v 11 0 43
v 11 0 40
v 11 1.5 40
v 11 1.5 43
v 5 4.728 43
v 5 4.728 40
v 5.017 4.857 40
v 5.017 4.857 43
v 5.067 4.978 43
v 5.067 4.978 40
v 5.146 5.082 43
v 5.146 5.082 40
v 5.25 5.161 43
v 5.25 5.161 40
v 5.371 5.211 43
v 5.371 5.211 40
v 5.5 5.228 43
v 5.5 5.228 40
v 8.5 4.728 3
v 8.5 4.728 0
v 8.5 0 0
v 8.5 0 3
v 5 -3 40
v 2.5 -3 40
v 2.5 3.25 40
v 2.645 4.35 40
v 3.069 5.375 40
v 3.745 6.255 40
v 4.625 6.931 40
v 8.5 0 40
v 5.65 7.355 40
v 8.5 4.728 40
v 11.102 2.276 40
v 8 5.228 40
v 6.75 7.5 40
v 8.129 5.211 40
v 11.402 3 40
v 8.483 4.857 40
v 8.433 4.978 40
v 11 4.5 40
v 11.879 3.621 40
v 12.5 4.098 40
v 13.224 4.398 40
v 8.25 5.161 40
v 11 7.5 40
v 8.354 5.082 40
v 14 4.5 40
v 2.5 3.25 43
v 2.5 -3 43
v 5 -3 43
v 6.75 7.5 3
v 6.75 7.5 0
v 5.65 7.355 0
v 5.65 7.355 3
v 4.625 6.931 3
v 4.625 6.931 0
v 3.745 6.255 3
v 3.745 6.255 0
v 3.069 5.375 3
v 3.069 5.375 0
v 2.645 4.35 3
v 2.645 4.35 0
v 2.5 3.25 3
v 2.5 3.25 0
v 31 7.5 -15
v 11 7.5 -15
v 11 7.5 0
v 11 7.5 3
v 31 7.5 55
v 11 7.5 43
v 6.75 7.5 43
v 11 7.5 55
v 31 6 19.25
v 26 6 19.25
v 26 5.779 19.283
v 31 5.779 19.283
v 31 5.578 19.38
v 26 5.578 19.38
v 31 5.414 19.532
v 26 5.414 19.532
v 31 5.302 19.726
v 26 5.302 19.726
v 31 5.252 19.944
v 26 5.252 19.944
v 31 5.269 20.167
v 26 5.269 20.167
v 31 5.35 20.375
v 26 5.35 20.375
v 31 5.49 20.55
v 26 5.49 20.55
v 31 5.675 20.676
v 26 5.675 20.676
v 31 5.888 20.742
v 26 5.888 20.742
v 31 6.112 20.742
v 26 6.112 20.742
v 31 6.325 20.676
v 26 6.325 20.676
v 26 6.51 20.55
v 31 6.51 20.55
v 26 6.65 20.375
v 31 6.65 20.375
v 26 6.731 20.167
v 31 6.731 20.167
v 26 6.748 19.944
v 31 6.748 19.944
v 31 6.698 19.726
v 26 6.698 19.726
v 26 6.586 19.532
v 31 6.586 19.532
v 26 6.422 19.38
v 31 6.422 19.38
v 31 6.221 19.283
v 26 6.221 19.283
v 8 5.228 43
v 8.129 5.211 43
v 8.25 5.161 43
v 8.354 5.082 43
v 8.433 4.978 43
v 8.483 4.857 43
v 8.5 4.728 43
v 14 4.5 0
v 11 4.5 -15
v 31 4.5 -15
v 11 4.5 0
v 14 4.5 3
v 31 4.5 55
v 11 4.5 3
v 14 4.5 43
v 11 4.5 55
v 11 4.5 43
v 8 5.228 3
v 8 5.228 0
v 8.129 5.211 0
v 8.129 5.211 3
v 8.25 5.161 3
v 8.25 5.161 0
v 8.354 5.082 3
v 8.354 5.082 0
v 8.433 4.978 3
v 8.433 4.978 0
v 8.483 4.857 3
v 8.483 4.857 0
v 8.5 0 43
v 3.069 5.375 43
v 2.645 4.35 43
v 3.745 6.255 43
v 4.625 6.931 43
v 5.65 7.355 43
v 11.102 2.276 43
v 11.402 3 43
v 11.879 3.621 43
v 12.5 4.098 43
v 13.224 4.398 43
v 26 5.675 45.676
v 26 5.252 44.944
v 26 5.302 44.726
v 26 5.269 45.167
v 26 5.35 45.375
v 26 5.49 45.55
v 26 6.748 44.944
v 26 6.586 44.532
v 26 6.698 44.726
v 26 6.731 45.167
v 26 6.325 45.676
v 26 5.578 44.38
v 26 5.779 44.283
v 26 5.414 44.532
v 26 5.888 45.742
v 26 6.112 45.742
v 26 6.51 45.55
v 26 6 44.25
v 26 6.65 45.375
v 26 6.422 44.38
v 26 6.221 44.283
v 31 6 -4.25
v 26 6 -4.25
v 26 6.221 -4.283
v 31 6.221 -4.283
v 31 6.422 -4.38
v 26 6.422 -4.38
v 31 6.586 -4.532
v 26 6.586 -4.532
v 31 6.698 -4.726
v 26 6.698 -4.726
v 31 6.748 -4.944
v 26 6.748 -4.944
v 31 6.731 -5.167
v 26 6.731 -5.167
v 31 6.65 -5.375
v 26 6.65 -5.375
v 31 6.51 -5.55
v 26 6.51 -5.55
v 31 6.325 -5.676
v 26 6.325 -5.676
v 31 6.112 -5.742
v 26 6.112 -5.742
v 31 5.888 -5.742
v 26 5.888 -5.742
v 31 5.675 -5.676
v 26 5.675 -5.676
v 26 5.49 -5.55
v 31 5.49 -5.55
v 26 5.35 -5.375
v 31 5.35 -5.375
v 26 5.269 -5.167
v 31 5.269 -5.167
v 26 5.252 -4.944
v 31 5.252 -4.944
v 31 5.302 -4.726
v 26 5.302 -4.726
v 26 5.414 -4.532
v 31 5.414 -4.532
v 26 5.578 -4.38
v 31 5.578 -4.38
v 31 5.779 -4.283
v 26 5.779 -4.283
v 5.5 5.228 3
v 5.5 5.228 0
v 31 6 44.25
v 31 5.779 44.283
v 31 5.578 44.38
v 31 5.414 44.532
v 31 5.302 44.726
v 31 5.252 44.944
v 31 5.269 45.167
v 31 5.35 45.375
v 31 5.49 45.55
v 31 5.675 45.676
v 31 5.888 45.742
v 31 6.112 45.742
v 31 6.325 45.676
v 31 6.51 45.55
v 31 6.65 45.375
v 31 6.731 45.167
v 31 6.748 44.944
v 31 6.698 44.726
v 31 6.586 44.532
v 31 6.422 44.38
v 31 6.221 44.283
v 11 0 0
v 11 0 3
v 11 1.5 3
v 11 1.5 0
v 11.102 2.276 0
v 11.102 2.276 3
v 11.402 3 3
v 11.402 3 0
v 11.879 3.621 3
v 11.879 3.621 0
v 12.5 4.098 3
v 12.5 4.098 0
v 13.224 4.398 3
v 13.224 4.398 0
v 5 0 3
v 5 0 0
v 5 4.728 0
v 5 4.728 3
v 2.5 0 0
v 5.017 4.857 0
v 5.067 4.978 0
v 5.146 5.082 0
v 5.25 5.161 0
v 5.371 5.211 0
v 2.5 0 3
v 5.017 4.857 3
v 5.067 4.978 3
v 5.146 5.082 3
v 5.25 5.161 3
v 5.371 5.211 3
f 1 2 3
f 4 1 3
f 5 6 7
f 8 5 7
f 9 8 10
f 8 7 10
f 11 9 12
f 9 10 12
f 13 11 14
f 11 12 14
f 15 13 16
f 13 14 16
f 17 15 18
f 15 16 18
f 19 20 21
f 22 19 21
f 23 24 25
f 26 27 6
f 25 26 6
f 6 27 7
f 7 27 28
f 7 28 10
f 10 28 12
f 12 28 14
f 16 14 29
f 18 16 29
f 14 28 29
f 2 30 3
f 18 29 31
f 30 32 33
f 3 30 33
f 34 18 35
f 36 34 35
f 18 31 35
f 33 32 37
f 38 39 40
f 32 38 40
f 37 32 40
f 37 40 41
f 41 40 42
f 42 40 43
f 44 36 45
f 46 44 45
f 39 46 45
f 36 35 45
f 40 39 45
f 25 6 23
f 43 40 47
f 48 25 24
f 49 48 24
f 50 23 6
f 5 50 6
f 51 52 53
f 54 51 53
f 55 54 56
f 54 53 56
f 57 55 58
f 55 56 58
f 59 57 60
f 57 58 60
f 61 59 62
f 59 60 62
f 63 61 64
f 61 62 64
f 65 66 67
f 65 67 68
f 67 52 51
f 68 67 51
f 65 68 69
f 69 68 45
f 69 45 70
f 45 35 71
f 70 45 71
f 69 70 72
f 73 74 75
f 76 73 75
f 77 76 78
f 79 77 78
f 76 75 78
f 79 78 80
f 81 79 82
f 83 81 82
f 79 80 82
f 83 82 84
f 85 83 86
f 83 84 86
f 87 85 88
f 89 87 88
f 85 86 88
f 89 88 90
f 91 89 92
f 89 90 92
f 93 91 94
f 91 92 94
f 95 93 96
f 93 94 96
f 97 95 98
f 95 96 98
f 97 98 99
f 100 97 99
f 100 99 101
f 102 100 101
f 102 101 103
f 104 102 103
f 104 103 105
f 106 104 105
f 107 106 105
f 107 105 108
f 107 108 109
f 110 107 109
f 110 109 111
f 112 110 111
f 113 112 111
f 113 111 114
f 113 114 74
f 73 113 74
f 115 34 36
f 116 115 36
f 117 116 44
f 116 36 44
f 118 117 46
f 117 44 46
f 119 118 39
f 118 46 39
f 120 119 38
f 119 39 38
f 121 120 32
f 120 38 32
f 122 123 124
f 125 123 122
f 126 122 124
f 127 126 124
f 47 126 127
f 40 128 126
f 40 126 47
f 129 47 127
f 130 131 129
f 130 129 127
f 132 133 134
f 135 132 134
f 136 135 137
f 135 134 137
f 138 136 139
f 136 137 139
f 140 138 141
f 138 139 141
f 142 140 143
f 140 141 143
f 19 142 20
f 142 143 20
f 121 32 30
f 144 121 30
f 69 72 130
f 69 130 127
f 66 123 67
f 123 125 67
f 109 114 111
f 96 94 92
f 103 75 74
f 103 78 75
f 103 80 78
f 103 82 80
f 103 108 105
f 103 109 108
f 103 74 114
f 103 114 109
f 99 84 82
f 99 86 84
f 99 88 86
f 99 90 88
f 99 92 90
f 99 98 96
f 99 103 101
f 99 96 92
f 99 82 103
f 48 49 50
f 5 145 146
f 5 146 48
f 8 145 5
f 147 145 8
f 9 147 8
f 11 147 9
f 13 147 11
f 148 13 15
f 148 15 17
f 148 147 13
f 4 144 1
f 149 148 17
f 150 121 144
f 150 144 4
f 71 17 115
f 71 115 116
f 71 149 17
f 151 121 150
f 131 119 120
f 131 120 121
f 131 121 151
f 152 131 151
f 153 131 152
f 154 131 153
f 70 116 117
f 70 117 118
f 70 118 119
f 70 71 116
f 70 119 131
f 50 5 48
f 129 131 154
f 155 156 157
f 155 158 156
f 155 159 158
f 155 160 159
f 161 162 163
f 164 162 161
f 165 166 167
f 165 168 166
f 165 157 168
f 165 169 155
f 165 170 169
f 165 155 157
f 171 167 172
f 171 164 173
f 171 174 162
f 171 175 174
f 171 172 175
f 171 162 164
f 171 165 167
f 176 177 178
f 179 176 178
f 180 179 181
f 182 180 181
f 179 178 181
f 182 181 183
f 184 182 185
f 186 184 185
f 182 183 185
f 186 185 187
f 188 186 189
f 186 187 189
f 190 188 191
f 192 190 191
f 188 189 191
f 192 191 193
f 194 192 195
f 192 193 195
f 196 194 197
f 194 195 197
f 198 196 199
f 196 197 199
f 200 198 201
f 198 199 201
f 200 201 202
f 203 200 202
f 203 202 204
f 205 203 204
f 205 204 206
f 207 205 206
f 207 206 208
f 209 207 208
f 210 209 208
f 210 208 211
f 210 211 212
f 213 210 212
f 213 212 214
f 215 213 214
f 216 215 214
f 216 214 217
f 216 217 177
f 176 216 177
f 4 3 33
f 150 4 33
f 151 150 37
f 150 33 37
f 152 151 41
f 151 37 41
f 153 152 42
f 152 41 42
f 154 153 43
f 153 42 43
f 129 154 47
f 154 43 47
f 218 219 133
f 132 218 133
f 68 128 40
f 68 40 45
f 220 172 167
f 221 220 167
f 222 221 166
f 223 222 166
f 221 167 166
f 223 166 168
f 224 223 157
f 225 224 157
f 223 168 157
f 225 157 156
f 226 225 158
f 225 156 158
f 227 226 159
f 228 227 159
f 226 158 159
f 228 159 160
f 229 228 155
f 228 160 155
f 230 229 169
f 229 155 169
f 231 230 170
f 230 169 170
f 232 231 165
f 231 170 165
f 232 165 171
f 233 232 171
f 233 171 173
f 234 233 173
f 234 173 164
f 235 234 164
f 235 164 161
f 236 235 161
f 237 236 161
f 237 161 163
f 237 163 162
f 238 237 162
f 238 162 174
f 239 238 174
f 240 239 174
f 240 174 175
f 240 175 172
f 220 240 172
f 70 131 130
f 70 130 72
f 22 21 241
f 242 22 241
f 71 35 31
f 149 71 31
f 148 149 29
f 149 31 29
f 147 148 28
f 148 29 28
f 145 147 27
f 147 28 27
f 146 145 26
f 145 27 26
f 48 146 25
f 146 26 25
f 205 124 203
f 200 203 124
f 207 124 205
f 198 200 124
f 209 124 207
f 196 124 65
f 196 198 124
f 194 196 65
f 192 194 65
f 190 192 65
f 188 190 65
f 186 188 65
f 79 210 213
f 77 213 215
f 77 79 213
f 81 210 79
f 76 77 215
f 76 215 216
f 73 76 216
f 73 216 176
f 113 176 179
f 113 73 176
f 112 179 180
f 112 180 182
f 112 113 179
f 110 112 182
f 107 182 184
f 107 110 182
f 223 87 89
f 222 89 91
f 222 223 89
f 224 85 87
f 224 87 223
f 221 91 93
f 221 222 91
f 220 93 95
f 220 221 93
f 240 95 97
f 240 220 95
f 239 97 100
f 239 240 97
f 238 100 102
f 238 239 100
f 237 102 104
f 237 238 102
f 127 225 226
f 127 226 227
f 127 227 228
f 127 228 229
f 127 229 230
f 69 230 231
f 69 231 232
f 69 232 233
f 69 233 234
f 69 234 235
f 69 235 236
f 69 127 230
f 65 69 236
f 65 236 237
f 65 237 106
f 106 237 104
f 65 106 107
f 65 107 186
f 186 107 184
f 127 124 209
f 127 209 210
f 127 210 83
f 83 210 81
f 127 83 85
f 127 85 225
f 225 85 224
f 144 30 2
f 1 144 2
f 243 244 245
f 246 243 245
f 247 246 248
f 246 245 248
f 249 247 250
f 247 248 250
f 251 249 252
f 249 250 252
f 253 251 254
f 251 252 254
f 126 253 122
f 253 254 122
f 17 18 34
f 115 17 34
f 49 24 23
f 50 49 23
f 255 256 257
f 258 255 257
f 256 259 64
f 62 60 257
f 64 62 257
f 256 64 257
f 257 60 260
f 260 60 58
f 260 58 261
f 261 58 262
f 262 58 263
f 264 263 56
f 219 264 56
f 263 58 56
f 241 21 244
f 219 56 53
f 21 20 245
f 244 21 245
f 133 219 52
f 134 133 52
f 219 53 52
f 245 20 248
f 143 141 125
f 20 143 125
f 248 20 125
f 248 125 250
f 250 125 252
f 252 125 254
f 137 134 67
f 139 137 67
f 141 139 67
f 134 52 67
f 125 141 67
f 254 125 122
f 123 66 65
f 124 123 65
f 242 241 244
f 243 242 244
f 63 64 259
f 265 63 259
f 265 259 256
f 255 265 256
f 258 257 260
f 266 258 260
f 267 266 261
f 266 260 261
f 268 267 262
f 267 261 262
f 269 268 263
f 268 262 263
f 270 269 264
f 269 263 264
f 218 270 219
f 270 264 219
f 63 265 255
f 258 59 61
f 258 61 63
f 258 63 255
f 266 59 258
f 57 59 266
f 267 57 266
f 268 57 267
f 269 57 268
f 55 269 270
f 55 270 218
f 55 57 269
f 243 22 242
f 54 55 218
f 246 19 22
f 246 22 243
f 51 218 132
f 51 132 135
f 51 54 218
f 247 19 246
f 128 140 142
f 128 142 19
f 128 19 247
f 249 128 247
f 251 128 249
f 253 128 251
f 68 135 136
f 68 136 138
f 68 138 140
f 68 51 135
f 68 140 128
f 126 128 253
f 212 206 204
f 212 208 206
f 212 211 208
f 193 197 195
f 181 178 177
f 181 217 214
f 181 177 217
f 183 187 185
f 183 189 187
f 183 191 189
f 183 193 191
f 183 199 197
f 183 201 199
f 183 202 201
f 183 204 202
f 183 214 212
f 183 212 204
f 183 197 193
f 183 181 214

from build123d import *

# Parameters (mm, degrees)
BOSS_EXTRUDE1_DEPTH      = 3
LPATTERN1_COUNT          = 2
LPATTERN1_PITCH          = 40
SKETCH2_W                = 20
SKETCH2_H                = 70
BOSS_EXTRUDE2_DEPTH      = 3
FILLET1_R                = 3
BOSS_EXTRUDE3_DEPTH      = 3
FILLET2_START            = -1
FILLET2_DEPTH            = 5
FILLET3_DEPTH            = 3
BOSS_EXTRUDE5_REACH      = 65.784
BOSS_EXTRUDE5_END_RADIUS = 10.25
SKETCH5_R                = 1.5
LPATTERN2_START          = 7.5
LPATTERN2_OUTLINE_R      = 1.5
LPATTERN2_DEPTH          = 1.302234895
LPATTERN2_START_2        = 8.802234895
LPATTERN2_2_OUTLINE_R    = 1.5
LPATTERN2_2_DEPTH        = 2.539759791
LPATTERN2_START_3        = 39
LPATTERN2_3_DEPTH        = 5
LPATTERN2_4_OUTLINE_R    = 1.5
LPATTERN2_4_DEPTH        = 1.302235223
LPATTERN2_START_4        = 8.802235223
LPATTERN2_5_OUTLINE_R    = 1.5
LPATTERN2_5_DEPTH        = 2.539761855
LPATTERN2_6_OUTLINE_W    = 10.25
LPATTERN2_6_OUTLINE_H    = 3.000220265
LPATTERN2_6_ANGLE        = 22.115218
LPATTERN2_START_5        = 40
LPATTERN2_7_DEPTH        = 3
CUT_EXTRUDE2_DEPTH       = 64.922422006
CUT_EXTRUDE2_DEPTH_BACK  = 64.922422006
SKETCH6_W                = 3.5
SKETCH6_H                = 1.978060381
FILLET4_R                = 0.5
SKETCH7_W                = 2.5
SKETCH7_H                = 3
BOSS_EXTRUDE6_DEPTH      = 3
SKETCH8_R                = 0.75
CUT_EXTRUDE3_DEPTH       = 5
MIRROR1_START            = -4.25
MIRROR1_OUTLINE_W        = 20
MIRROR1_OUTLINE_H        = 3
MIRROR1_DEPTH            = 23.4999999
MIRROR1_START_2          = 20.75
MIRROR1_2_OUTLINE_W      = 20
MIRROR1_2_OUTLINE_H      = 3
MIRROR1_2_DEPTH          = 23.4999999
MIRROR1_START_3          = 45.75
MIRROR1_3_OUTLINE_W      = 20
MIRROR1_3_OUTLINE_H      = 3
MIRROR1_3_DEPTH          = 9.25
MIRROR1_START_4          = -15
MIRROR1_4_OUTLINE_W      = 20
MIRROR1_4_OUTLINE_H      = 3
MIRROR1_4_DEPTH          = 9.2499999
MIRROR1_START_5          = 40
MIRROR1_5_DEPTH          = 3
MIRROR1_6_DEPTH          = 3
MIRROR1_START_6          = 11
MIRROR1_7_OUTLINE_W      = 3
MIRROR1_7_OUTLINE_H      = 1.5000001
MIRROR1_7_DEPTH          = 15
MIRROR1_START_7          = 26
MIRROR1_8_DEPTH          = 5
MIRROR1_START_8          = 7.5
MIRROR1_9_OUTLINE_R      = 1.5
MIRROR1_9_DEPTH          = 1.302234895
MIRROR1_START_9          = 8.802234895
MIRROR1_10_OUTLINE_R     = 1.5
MIRROR1_10_DEPTH         = 2.539759791
MIRROR1_START_10         = -1
MIRROR1_11_DEPTH         = 5
MIRROR1_12_OUTLINE_R     = 1.5
MIRROR1_12_DEPTH         = 1.302235223
MIRROR1_START_11         = 8.802235223
MIRROR1_13_OUTLINE_R     = 1.5
MIRROR1_13_DEPTH         = 2.539761855
MIRROR1_14_OUTLINE_W     = 10.25
MIRROR1_14_OUTLINE_H     = 3.000220265
MIRROR1_14_ANGLE         = 22.115218
MIRROR1_15_DEPTH         = 3
MIRROR1_16_OUTLINE_R     = 1.5
MIRROR1_16_DEPTH         = 1.302234895
MIRROR1_17_OUTLINE_R     = 1.5
MIRROR1_17_DEPTH         = 2.539759791
MIRROR1_START_12         = 39
MIRROR1_18_DEPTH         = 5
MIRROR1_19_DEPTH         = 3
MIRROR1_20_OUTLINE_R     = 1.5
MIRROR1_20_DEPTH         = 1.302235223
MIRROR1_21_OUTLINE_R     = 1.5
MIRROR1_21_DEPTH         = 2.539761855
MIRROR1_22_OUTLINE_W     = 10.25
MIRROR1_22_OUTLINE_H     = 3.000220265
MIRROR1_22_ANGLE         = 22.115218
CUT_EXTRUDE4_DEPTH       = 82.052921206
CUT_EXTRUDE4_DEPTH_BACK  = 82.052921206
SKETCH9_W                = 31.619894417
SKETCH9_H                = 19.739229587


with BuildPart() as part:
    # Sketch1 → Boss-Extrude1 (new body)
    with BuildSketch(Plane.XY):
        with BuildLine():
            Line((0, 3.25), (0, 0))
            Line((0, 0), (2.5, 0))
            Line((2.5, 0), (2.5, 3.25))
            ThreePointArc((2.5, 3.25), (1.25520382, 6.25520382), (-1.75, 7.5))
            Line((-1.75, 7.5), (-6, 7.5))
            Line((-6, 7.5), (-6, 3.25))
            Line((-6, 3.25), (-6, 0))
            Line((-6, 0), (-3.5, 0))
            Line((-3.5, 0), (-3.5, 3.25))
            ThreePointArc((-3.5, 3.25), (-1.75, 5), (0, 3.25))
        make_face()
    extrude(amount=BOSS_EXTRUDE1_DEPTH)


with BuildPart() as lpattern1_1:
    # LPattern1: pattern copy
    add(part.part.moved(Location(Vector(0, 0, 1) * (1 * LPATTERN1_PITCH))))


with BuildPart() as part_1:
    add(part.part)

    add(lpattern1_1.part)  # Boss-Extrude2 merges LPattern1_1
    # Sketch2 → Boss-Extrude2 (add)
    with BuildSketch(Plane(origin=(0, 7.5, 0), x_dir=(1, 0, 0), z_dir=(0, 1, 0))):
        with Locations((-16, -20)):
            Rectangle(SKETCH2_W, SKETCH2_H)
    extrude(amount=-BOSS_EXTRUDE2_DEPTH)

    # Fillet1
    fillet1_edges = [part_1.edges().sort_by_distance(p)[0] for p in [
        (-6, 4.5, 1.5),
        (-6, 4.5, 41.5),
    ]]
    fillet(fillet1_edges, radius=FILLET1_R)

    # Sketch6 → Cut-Extrude2 (cut, two sides: drawn at the far end of the back side and taken through both)
    with BuildSketch(Plane.XY.offset(3).offset(-CUT_EXTRUDE2_DEPTH_BACK)):
        with Locations((-1.75, 4.239030191)):
            Rectangle(SKETCH6_W, SKETCH6_H)
    extrude(amount=CUT_EXTRUDE2_DEPTH + CUT_EXTRUDE2_DEPTH_BACK, mode=Mode.SUBTRACT)

    # Fillet4
    fillet4_edges = [part_1.edges().sort_by_distance(p)[0] for p in [
        (-3.5, 5.228060381, 1.5),
        (-3.5, 5.228060381, 41.5),
        (0, 5.228060381, 1.5),
        (0, 5.228060381, 41.5),
    ]]
    fillet(fillet4_edges, radius=FILLET4_R)

    # Sketch7 → Boss-Extrude6 (add)
    with BuildSketch(Plane.XY.offset(43)):
        with Locations((1.25, -1.5)):
            Rectangle(SKETCH7_W, SKETCH7_H)
    extrude(amount=-BOSS_EXTRUDE6_DEPTH)

    # Sketch8 → Cut-Extrude3 (cut)
    with BuildSketch(Plane.ZY.offset(26)):
        with Locations((-5, 6)):
            Circle(SKETCH8_R)
        with Locations((20, 6)):
            Circle(SKETCH8_R)
        with Locations((45, 6)):
            Circle(SKETCH8_R)
    extrude(amount=-CUT_EXTRUDE3_DEPTH, mode=Mode.SUBTRACT)


with BuildPart() as body_2:
    # Sketch4 → Boss-Extrude3 (new body)
    with BuildSketch(Plane.XY.offset(3)):
        with BuildLine():
            Line((-20.857798696, 25.621740076), (-21.206324936, 26.579308051))
            ThreePointArc((-21.206324936, 26.579308051), (-16.672163531, 7.522062955), (-9.682947675, 25.822010278))
            Line((-9.682947675, 25.822010278), (-10.11803023, 24.888972729))
            ThreePointArc((-10.11803023, 24.888972729), (-16.629657521, 8.521455618), (-20.857798696, 25.621740076))
        make_face()
    extrude(amount=-BOSS_EXTRUDE3_DEPTH)

    # Fillet2: read off the stored shape, not the designer's step
    # Fillet2 outline → Fillet2 (cut)
    with BuildSketch(Plane.XY.offset(FILLET2_START)):
        with BuildLine():
            add(Edge.make_bspline(
                [(-20.994076432, 25.996160077), (-21.074153595, 26.216170321), (-21.251523965, 26.350710286), (-21.454646821, 26.373043505), (-21.624101617, 26.320471493), (-21.744123922, 26.239260296)],
                knots=[0.438237279, 0.438237279, 0.438237279, 0.438237279, 0.438237279, 0.438237279, 1, 1, 1, 1, 1, 1], degree=5, weights=[0.507629267, 0.479872472, 0.515231147, 0.613705294, 0.775294911, 1]))
            Line((-20.994076432, 25.996160077), (-21.206324936, 26.579308051))
            ThreePointArc((-21.206324936, 26.579308051), (-21.477863695, 26.413458278), (-21.744123922, 26.239260296))
        make_face()
        with BuildLine():
            add(Edge.make_bspline(
                [(-21.183721588, 25.411039779), (-21.095700521, 25.470597844), (-21.011417818, 25.561339411), (-20.949957611, 25.687250869), (-20.937439038, 25.840550084), (-20.994076432, 25.996160077)],
                knots=[0, 0, 0, 0, 0, 0, 0.438237279, 0.438237279, 0.438237279, 0.438237279, 0.438237279, 0.438237279], degree=5, weights=[1, 0.824705088, 0.687820559, 0.589346413, 0.529282649, 0.507629267]))
            ThreePointArc((-21.183721588, 25.411039779), (-21.021865296, 25.518099442), (-20.857798696, 25.621740076))
            Line((-20.857798696, 25.621740076), (-20.994076432, 25.996160077))
        make_face()
    extrude(amount=FILLET2_DEPTH, mode=Mode.SUBTRACT)

    # Fillet3: read off the stored shape, not the designer's step
    # Fillet3 outline → Fillet3 (cut)
    with BuildSketch(Plane.XY):
        with BuildLine():
            add(Edge.make_bspline(
                [(-9.171518011, 25.394235327), (-9.282578146, 25.493443697), (-9.44922289, 25.569577268), (-9.660410728, 25.570842005), (-9.856114015, 25.450653826), (-9.957768573, 25.23265496)],
                knots=[0, 0, 0, 0, 0, 0, 0.573717386, 0.573717386, 0.573717386, 0.573717386, 0.573717386, 0.573717386], degree=5, weights=[1, 0.770513046, 0.606856419, 0.50903012, 0.477034149, 0.510868506]))
            ThreePointArc((-9.171518011, 25.394235327), (-9.423753658, 25.612282369), (-9.682947675, 25.822010278))
            Line((-9.682947675, 25.822010278), (-9.957768573, 25.23265496))
        make_face()
        with BuildLine():
            add(Edge.make_bspline(
                [(-9.957768573, 25.23265496), (-10.024989519, 25.088499201), (-10.028130695, 24.940896848), (-9.983698166, 24.813907164), (-9.914364214, 24.716929113), (-9.837711376, 24.648456271)],
                knots=[0.573717386, 0.573717386, 0.573717386, 0.573717386, 0.573717386, 0.573717386, 1, 1, 1, 1, 1, 1], degree=5, weights=[0.510868506, 0.536008058, 0.597490983, 0.695317282, 0.829486954, 1]))
            Line((-9.957768573, 25.23265496), (-10.11803023, 24.888972729))
            ThreePointArc((-10.11803023, 24.888972729), (-9.976670181, 24.770113809), (-9.837711376, 24.648456271))
        make_face()
    extrude(amount=FILLET3_DEPTH, mode=Mode.SUBTRACT)


with BuildPart() as body_3:
    # Boss-Extrude5: up to this cylinder (the profile starts outside it)
    boss_extrude5_end = Plane(origin=(-16, 17.75, 1.5), z_dir=(0, 0, 1)) * Cylinder(BOSS_EXTRUDE5_END_RADIUS, 153.068, mode=Mode.PRIVATE)
    # Sketch5 → Boss-Extrude5 (new, up to the surface)
    with BuildSketch(Plane(origin=(0, 7.5, 0), x_dir=(1, 0, 0), z_dir=(0, 1, 0)), mode=Mode.PRIVATE) as boss_extrude5_sk1:
        with Locations(Location((-22.5, -1.5, 0), (0, 0, 90))):
            Circle(SKETCH5_R)
    boss_extrude5_tool1 = extrude(boss_extrude5_sk1.sketch, amount=BOSS_EXTRUDE5_REACH, mode=Mode.PRIVATE) - boss_extrude5_end
    add(boss_extrude5_tool1.solids().sort_by_distance((-22.5, 7.5, 1.5))[0])
    # Sketch5 → Boss-Extrude5 (new, up to the surface)
    with BuildSketch(Plane(origin=(0, 7.5, 0), x_dir=(1, 0, 0), z_dir=(0, 1, 0)), mode=Mode.PRIVATE) as boss_extrude5_sk2:
        with Locations(Location((-9.5, -1.5, 0), (0, 0, 90))):
            Circle(SKETCH5_R)
    boss_extrude5_tool2 = extrude(boss_extrude5_sk2.sketch, amount=BOSS_EXTRUDE5_REACH, mode=Mode.PRIVATE) - boss_extrude5_end
    add(boss_extrude5_tool2.solids().sort_by_distance((-9.5, 7.5, 1.5))[0])


with BuildPart() as body_4:
    # LPattern2: read off the stored shape, not the designer's step
    # LPattern2 outline → LPattern2 (new body)
    with BuildSketch(Plane(origin=(0, 0, 0), x_dir=(1, 0, 0), z_dir=(0, 1, 0)).offset(LPATTERN2_START)):
        with Locations((-22.5, -41.5)):
            Circle(LPATTERN2_OUTLINE_R)
    extrude(amount=LPATTERN2_DEPTH)

    # LPattern2 2 outline → LPattern2 2 (add)
    with BuildSketch(Plane(origin=(0, 0, 0), x_dir=(1, 0, 0), z_dir=(0, 1, 0)).offset(LPATTERN2_START_2)):
        with Locations((-22.5, -41.5)):
            Circle(LPATTERN2_2_OUTLINE_R)
    extrude(amount=LPATTERN2_2_DEPTH)

    # LPattern2 3 outline → LPattern2 3 (cut)
    with BuildSketch(Plane.XY.offset(LPATTERN2_START_3)):
        with BuildLine():
            Line((-20, 11.341994686), (-23.999998778, 11.341995665))
            ThreePointArc((-23.999998778, 11.341995665), (-22.622702211, 9.926809128), (-20.999584885, 8.802002963))
            Line((-20.999584885, 8.802002963), (-20, 8.243497024))
            Line((-20, 8.243497024), (-20, 11.341994686))
        make_face()
    extrude(amount=LPATTERN2_3_DEPTH, mode=Mode.SUBTRACT)


with BuildPart() as body_5:
    # LPattern2 4 outline → LPattern2 4 (new body)
    with BuildSketch(Plane(origin=(0, 0, 0), x_dir=(1, 0, 0), z_dir=(0, 1, 0)).offset(LPATTERN2_START)):
        with Locations((-9.5, -41.5)):
            Circle(LPATTERN2_4_OUTLINE_R)
    extrude(amount=LPATTERN2_4_DEPTH)

    # LPattern2 5 outline → LPattern2 5 (add)
    with BuildSketch(Plane(origin=(0, 0, 0), x_dir=(1, 0, 0), z_dir=(0, 1, 0)).offset(LPATTERN2_START_4)):
        with Locations((-9.5, -41.5)):
            Circle(LPATTERN2_5_OUTLINE_R)
    extrude(amount=LPATTERN2_5_DEPTH)

    # LPattern2 6 outline → LPattern2 6 (revolve, cut)
    with BuildSketch(Plane(origin=(-16, 17.75, 0), x_dir=(0.4877650283417417, -0.8729749579035929, 0), z_dir=(-0.8729749579035929, -0.4877650283417417, 0))):
        with Locations((5.125, 41.500109978)):
            Rectangle(LPATTERN2_6_OUTLINE_W, LPATTERN2_6_OUTLINE_H)
    revolve(axis=Axis((-16, 17.75, 0), (0, 0, 1)), revolution_arc=LPATTERN2_6_ANGLE, mode=Mode.SUBTRACT)


with BuildPart() as body_6:
    # LPattern2 7 outline → LPattern2 7 (new body)
    with BuildSketch(Plane.XY.offset(LPATTERN2_START_5)):
        with BuildLine():
            ThreePointArc((-21.744123922, 26.239260296), (-16.687368099, 7.523073526), (-9.171518011, 25.394235327))
            add(Edge.make_bspline(
                [(-9.171518011, 25.394235327), (-9.42011103, 25.616299782), (-9.897400645, 25.707435586), (-10.230497327, 25.334546058), (-10.086304395, 24.870520725), (-9.837711376, 24.648456271)],
                knots=[0, 0, 0, 0, 0, 0, 1, 1, 1, 1, 1, 1], degree=5, weights=[1, 0.6, 0.4, 0.4, 0.6, 1]))
            ThreePointArc((-9.837711376, 24.648456271), (-16.620307797, 8.520822451), (-21.183721588, 25.41103978))
            add(Edge.make_bspline(
                [(-21.183721588, 25.41103978), (-20.907648082, 25.597840557), (-20.702656783, 26.038396659), (-20.98285795, 26.452506918), (-21.468050416, 26.426061074), (-21.744123922, 26.239260296)],
                knots=[0, 0, 0, 0, 0, 0, 1, 1, 1, 1, 1, 1], degree=5, weights=[1, 0.6, 0.4, 0.4, 0.6, 1]))
        make_face()
    extrude(amount=LPATTERN2_7_DEPTH)


with BuildPart() as body_7:
    # Mirror1: read off the stored shape, not the designer's step
    # Mirror1 outline → Mirror1 (new body)
    with BuildSketch(Plane.XY.offset(MIRROR1_START)):
        with Locations((21, 6)):
            Rectangle(MIRROR1_OUTLINE_W, MIRROR1_OUTLINE_H)
    extrude(amount=MIRROR1_DEPTH)

    # Mirror1 2 outline → Mirror1 2 (add)
    with BuildSketch(Plane.XY.offset(MIRROR1_START_2)):
        with Locations((21, 6)):
            Rectangle(MIRROR1_2_OUTLINE_W, MIRROR1_2_OUTLINE_H)
    extrude(amount=MIRROR1_2_DEPTH)

    # Mirror1 3 outline → Mirror1 3 (add)
    with BuildSketch(Plane.XY.offset(MIRROR1_START_3)):
        with Locations((21, 6)):
            Rectangle(MIRROR1_3_OUTLINE_W, MIRROR1_3_OUTLINE_H)
    extrude(amount=MIRROR1_3_DEPTH)

    # Mirror1 4 outline → Mirror1 4 (add)
    with BuildSketch(Plane.XY.offset(MIRROR1_START_4)):
        with Locations((21, 6)):
            Rectangle(MIRROR1_4_OUTLINE_W, MIRROR1_4_OUTLINE_H)
    extrude(amount=MIRROR1_4_DEPTH)

    # Mirror1 5 outline → Mirror1 5 (add)
    with BuildSketch(Plane.XY.offset(MIRROR1_START_5)):
        with BuildLine():
            Line((11, 4.5), (11, 7.5))
            Line((11, 7.5), (6.75, 7.5))
            ThreePointArc((6.75, 7.5), (3.74479618, 6.25520382), (2.5, 3.25))
            Line((2.5, 3.25), (2.5, -3))
            Line((2.5, -3), (5, -3))
            Line((5, -3), (5, 4.728060381))
            ThreePointArc((5, 4.728060381), (5.146446609, 5.081613772), (5.5, 5.228060381))
            Line((5.5, 5.228060381), (8, 5.228060381))
            ThreePointArc((8, 5.228060381), (8.353553391, 5.081613772), (8.5, 4.728060381))
            Line((8.5, 4.728060381), (8.5, 0))
            Line((8.5, 0), (11, 0))
            Line((11, 0), (11, 1.5))
            ThreePointArc((11, 1.5), (11.878679656, 3.621320344), (14, 4.5))
            Line((14, 4.5), (11, 4.5))
        make_face()
    extrude(amount=MIRROR1_5_DEPTH)

    # Mirror1 6 outline → Mirror1 6 (add)
    with BuildSketch(Plane.XY):
        with BuildLine():
            Line((11, 4.5), (11, 7.5))
            Line((11, 7.5), (6.75, 7.5))
            ThreePointArc((6.75, 7.5), (3.74479618, 6.25520382), (2.5, 3.25))
            Line((2.5, 3.25), (2.5, 0))
            Line((2.5, 0), (5, 0))
            Line((5, 0), (5, 4.728060381))
            ThreePointArc((5, 4.728060381), (5.146446609, 5.081613772), (5.5, 5.228060381))
            Line((5.5, 5.228060381), (8, 5.228060381))
            ThreePointArc((8, 5.228060381), (8.353553391, 5.081613772), (8.5, 4.728060381))
            Line((8.5, 4.728060381), (8.5, 0))
            Line((8.5, 0), (11, 0))
            Line((11, 0), (11, 1.5))
            ThreePointArc((11, 1.5), (11.878679656, 3.621320344), (14, 4.5))
            Line((14, 4.5), (11, 4.5))
        make_face()
    extrude(amount=MIRROR1_6_DEPTH)

    # Mirror1 7 outline → Mirror1 7 (add)
    with BuildSketch(Plane.YZ.offset(MIRROR1_START_6)):
        with Locations((6, -5.00000005)):
            Rectangle(MIRROR1_7_OUTLINE_W, MIRROR1_7_OUTLINE_H)
        with Locations((6, 19.99999995)):
            Rectangle(MIRROR1_7_OUTLINE_W, MIRROR1_7_OUTLINE_H)
        with Locations((6, 44.99999995)):
            Rectangle(MIRROR1_7_OUTLINE_W, MIRROR1_7_OUTLINE_H)
    extrude(amount=MIRROR1_7_DEPTH)

    # Mirror1 8 outline → Mirror1 8 (add)
    with BuildSketch(Plane.YZ.offset(MIRROR1_START_7)):
        with BuildLine():
            Line((6, -5.75), (7.5, -5.7500001))
            Line((7.5, -5.7500001), (7.5, -4.25))
            Line((7.5, -4.25), (6, -4.25))
            ThreePointArc((6, -4.25), (6.75, -5), (6, -5.75))
        make_face()
        with BuildLine():
            Line((4.5, -5.7500001), (6, -5.75))
            ThreePointArc((6, -5.75), (5.25, -5), (6, -4.25))
            Line((6, -4.25), (4.5, -4.25))
            Line((4.5, -4.25), (4.5, -5.7500001))
        make_face()
        with BuildLine():
            Line((6, 19.25), (7.5, 19.2499999))
            Line((7.5, 19.2499999), (7.5, 20.75))
            Line((7.5, 20.75), (6, 20.75))
            ThreePointArc((6, 20.75), (6.75, 20), (6, 19.25))
        make_face()
        with BuildLine():
            Line((4.5, 19.2499999), (6, 19.25))
            ThreePointArc((6, 19.25), (5.25, 20), (6, 20.75))
            Line((6, 20.75), (4.5, 20.75))
            Line((4.5, 20.75), (4.5, 19.2499999))
        make_face()
        with BuildLine():
            Line((6, 44.25), (7.5, 44.2499999))
            Line((7.5, 44.2499999), (7.5, 45.75))
            Line((7.5, 45.75), (6, 45.75))
            ThreePointArc((6, 45.75), (6.75, 45), (6, 44.25))
        make_face()
        with BuildLine():
            Line((4.5, 44.2499999), (6, 44.25))
            ThreePointArc((6, 44.25), (5.25, 45), (6, 45.75))
            Line((6, 45.75), (4.5, 45.75))
            Line((4.5, 45.75), (4.5, 44.2499999))
        make_face()
    extrude(amount=MIRROR1_8_DEPTH)


with BuildPart() as body_8:
    # Mirror1 9 outline → Mirror1 9 (new body)
    with BuildSketch(Plane(origin=(0, 0, 0), x_dir=(1, 0, 0), z_dir=(0, 1, 0)).offset(MIRROR1_START_8)):
        with Locations((27.5, -1.5)):
            Circle(MIRROR1_9_OUTLINE_R)
    extrude(amount=MIRROR1_9_DEPTH)

    # Mirror1 10 outline → Mirror1 10 (add)
    with BuildSketch(Plane(origin=(0, 0, 0), x_dir=(1, 0, 0), z_dir=(0, 1, 0)).offset(MIRROR1_START_9)):
        with Locations((27.5, -1.5)):
            Circle(MIRROR1_10_OUTLINE_R)
    extrude(amount=MIRROR1_10_DEPTH)

    # Mirror1 11 outline → Mirror1 11 (cut)
    with BuildSketch(Plane.XY.offset(MIRROR1_START_10)):
        with BuildLine():
            Line((25, 8.243497024), (25.999584885, 8.802002963))
            ThreePointArc((25.999584885, 8.802002963), (27.622702211, 9.926809128), (28.999998778, 11.341995665))
            Line((28.999998778, 11.341995665), (25, 11.341994686))
            Line((25, 11.341994686), (25, 8.243497024))
        make_face()
    extrude(amount=MIRROR1_11_DEPTH, mode=Mode.SUBTRACT)


with BuildPart() as body_9:
    # Mirror1 12 outline → Mirror1 12 (new body)
    with BuildSketch(Plane(origin=(0, 0, 0), x_dir=(1, 0, 0), z_dir=(0, 1, 0)).offset(MIRROR1_START_8)):
        with Locations((14.5, -41.5)):
            Circle(MIRROR1_12_OUTLINE_R)
    extrude(amount=MIRROR1_12_DEPTH)

    # Mirror1 13 outline → Mirror1 13 (add)
    with BuildSketch(Plane(origin=(0, 0, 0), x_dir=(1, 0, 0), z_dir=(0, 1, 0)).offset(MIRROR1_START_11)):
        with Locations((14.5, -41.5)):
            Circle(MIRROR1_13_OUTLINE_R)
    extrude(amount=MIRROR1_13_DEPTH)

    # Mirror1 14 outline → Mirror1 14 (revolve, cut)
    with BuildSketch(Plane(origin=(21, 17.75, 0), x_dir=(-0.7805286813468162, -0.6251199705616516, 0), z_dir=(-0.6251199705616516, 0.7805286813468162, 0))):
        with Locations((5.125, 41.500109978)):
            Rectangle(MIRROR1_14_OUTLINE_W, MIRROR1_14_OUTLINE_H)
    revolve(axis=Axis((21, 17.75, 0), (0, 0, 1)), revolution_arc=MIRROR1_14_ANGLE, mode=Mode.SUBTRACT)


with BuildPart() as body_10:
    # Mirror1 15 outline → Mirror1 15 (new body)
    with BuildSketch(Plane.XY.offset(MIRROR1_START_5)):
        with BuildLine():
            add(Edge.make_bspline(
                [(14.171518011, 25.394235327), (14.42011103, 25.616299782), (14.897400645, 25.707435586), (15.230497327, 25.334546058), (15.086304395, 24.870520725), (14.837711376, 24.648456271)],
                knots=[0, 0, 0, 0, 0, 0, 1, 1, 1, 1, 1, 1], degree=5, weights=[1, 0.6, 0.4, 0.4, 0.6, 1]))
            ThreePointArc((14.171518011, 25.394235327), (21.687368099, 7.523073526), (26.744123922, 26.239260296))
            add(Edge.make_bspline(
                [(26.183721588, 25.411039779), (25.907648082, 25.597840557), (25.702656783, 26.038396659), (25.98285795, 26.452506918), (26.468050416, 26.426061074), (26.744123922, 26.239260296)],
                knots=[0, 0, 0, 0, 0, 0, 1, 1, 1, 1, 1, 1], degree=5, weights=[1, 0.6, 0.4, 0.4, 0.6, 1]))
            ThreePointArc((26.183721588, 25.411039779), (21.620307797, 8.520822451), (14.837711376, 24.648456271))
        make_face()
    extrude(amount=MIRROR1_15_DEPTH)


with BuildPart() as body_11:
    # Mirror1 16 outline → Mirror1 16 (new body)
    with BuildSketch(Plane(origin=(0, 0, 0), x_dir=(1, 0, 0), z_dir=(0, 1, 0)).offset(MIRROR1_START_8)):
        with Locations((27.5, -41.5)):
            Circle(MIRROR1_16_OUTLINE_R)
    extrude(amount=MIRROR1_16_DEPTH)

    # Mirror1 17 outline → Mirror1 17 (add)
    with BuildSketch(Plane(origin=(0, 0, 0), x_dir=(1, 0, 0), z_dir=(0, 1, 0)).offset(MIRROR1_START_9)):
        with Locations((27.5, -41.5)):
            Circle(MIRROR1_17_OUTLINE_R)
    extrude(amount=MIRROR1_17_DEPTH)

    # Mirror1 18 outline → Mirror1 18 (cut)
    with BuildSketch(Plane.XY.offset(MIRROR1_START_12)):
        with BuildLine():
            Line((25, 8.243497024), (25.999584885, 8.802002963))
            ThreePointArc((25.999584885, 8.802002963), (27.622702211, 9.926809128), (28.999998778, 11.341995665))
            Line((28.999998778, 11.341995665), (25, 11.341994686))
            Line((25, 11.341994686), (25, 8.243497024))
        make_face()
    extrude(amount=MIRROR1_18_DEPTH, mode=Mode.SUBTRACT)


with BuildPart() as body_12:
    # Mirror1 19 outline → Mirror1 19 (new body)
    with BuildSketch(Plane.XY):
        with BuildLine():
            add(Edge.make_bspline(
                [(14.171518011, 25.394235327), (14.42011103, 25.616299782), (14.897400645, 25.707435586), (15.230497327, 25.334546058), (15.086304395, 24.870520725), (14.837711376, 24.648456271)],
                knots=[0, 0, 0, 0, 0, 0, 1, 1, 1, 1, 1, 1], degree=5, weights=[1, 0.6, 0.4, 0.4, 0.6, 1]))
            ThreePointArc((14.171518011, 25.394235327), (21.687368099, 7.523073526), (26.744123922, 26.239260296))
            add(Edge.make_bspline(
                [(26.183721588, 25.411039779), (25.907648082, 25.597840557), (25.702656783, 26.038396659), (25.98285795, 26.452506918), (26.468050416, 26.426061074), (26.744123922, 26.239260296)],
                knots=[0, 0, 0, 0, 0, 0, 1, 1, 1, 1, 1, 1], degree=5, weights=[1, 0.6, 0.4, 0.4, 0.6, 1]))
            ThreePointArc((26.183721588, 25.411039779), (21.620307797, 8.520822451), (14.837711376, 24.648456271))
        make_face()
    extrude(amount=MIRROR1_19_DEPTH)


with BuildPart() as body_13:
    # Mirror1 20 outline → Mirror1 20 (new body)
    with BuildSketch(Plane(origin=(0, 0, 0), x_dir=(1, 0, 0), z_dir=(0, 1, 0)).offset(MIRROR1_START_8)):
        with Locations((14.5, -1.5)):
            Circle(MIRROR1_20_OUTLINE_R)
    extrude(amount=MIRROR1_20_DEPTH)

    # Mirror1 21 outline → Mirror1 21 (add)
    with BuildSketch(Plane(origin=(0, 0, 0), x_dir=(1, 0, 0), z_dir=(0, 1, 0)).offset(MIRROR1_START_11)):
        with Locations((14.5, -1.5)):
            Circle(MIRROR1_21_OUTLINE_R)
    extrude(amount=MIRROR1_21_DEPTH)

    # Mirror1 22 outline → Mirror1 22 (revolve, cut)
    with BuildSketch(Plane(origin=(21, 17.75, 0), x_dir=(-0.7805286813468165, -0.6251199705616513, 0), z_dir=(-0.6251199705616513, 0.7805286813468165, 0))):
        with Locations((5.125, 1.500109978)):
            Rectangle(MIRROR1_22_OUTLINE_W, MIRROR1_22_OUTLINE_H)
    revolve(axis=Axis((21, 17.75, 0), (0, 0, 1)), revolution_arc=MIRROR1_22_ANGLE, mode=Mode.SUBTRACT)


with BuildPart() as cut_extrude4_tool:
    # Sketch9 → Cut-Extrude4 (new, two sides: drawn at the far end of the back side and taken through both)
    with BuildSketch(Plane.XY.offset(55).offset(-CUT_EXTRUDE4_DEPTH_BACK)):
        with Locations((21.361201043, 17.369614794)):
            Rectangle(SKETCH9_W, SKETCH9_H)
    extrude(amount=CUT_EXTRUDE4_DEPTH + CUT_EXTRUDE4_DEPTH_BACK)


with BuildPart() as body_8_1:
    add(body_8.part)

    # Cut-Extrude4: cut by cut_extrude4_tool
    add(cut_extrude4_tool.part, mode=Mode.SUBTRACT)


with BuildPart() as body_9_1:
    add(body_9.part)

    # Cut-Extrude4: cut by cut_extrude4_tool
    add(cut_extrude4_tool.part, mode=Mode.SUBTRACT)


with BuildPart() as body_10_1:
    add(body_10.part)

    # Cut-Extrude4: cut by cut_extrude4_tool
    add(cut_extrude4_tool.part, mode=Mode.SUBTRACT)


with BuildPart() as body_11_1:
    add(body_11.part)

    # Cut-Extrude4: cut by cut_extrude4_tool
    add(cut_extrude4_tool.part, mode=Mode.SUBTRACT)


with BuildPart() as body_12_1:
    add(body_12.part)

    # Cut-Extrude4: cut by cut_extrude4_tool
    add(cut_extrude4_tool.part, mode=Mode.SUBTRACT)


with BuildPart() as body_13_1:
    add(body_13.part)

    # Cut-Extrude4: cut by cut_extrude4_tool
    add(cut_extrude4_tool.part, mode=Mode.SUBTRACT)


solid = body_7.part
